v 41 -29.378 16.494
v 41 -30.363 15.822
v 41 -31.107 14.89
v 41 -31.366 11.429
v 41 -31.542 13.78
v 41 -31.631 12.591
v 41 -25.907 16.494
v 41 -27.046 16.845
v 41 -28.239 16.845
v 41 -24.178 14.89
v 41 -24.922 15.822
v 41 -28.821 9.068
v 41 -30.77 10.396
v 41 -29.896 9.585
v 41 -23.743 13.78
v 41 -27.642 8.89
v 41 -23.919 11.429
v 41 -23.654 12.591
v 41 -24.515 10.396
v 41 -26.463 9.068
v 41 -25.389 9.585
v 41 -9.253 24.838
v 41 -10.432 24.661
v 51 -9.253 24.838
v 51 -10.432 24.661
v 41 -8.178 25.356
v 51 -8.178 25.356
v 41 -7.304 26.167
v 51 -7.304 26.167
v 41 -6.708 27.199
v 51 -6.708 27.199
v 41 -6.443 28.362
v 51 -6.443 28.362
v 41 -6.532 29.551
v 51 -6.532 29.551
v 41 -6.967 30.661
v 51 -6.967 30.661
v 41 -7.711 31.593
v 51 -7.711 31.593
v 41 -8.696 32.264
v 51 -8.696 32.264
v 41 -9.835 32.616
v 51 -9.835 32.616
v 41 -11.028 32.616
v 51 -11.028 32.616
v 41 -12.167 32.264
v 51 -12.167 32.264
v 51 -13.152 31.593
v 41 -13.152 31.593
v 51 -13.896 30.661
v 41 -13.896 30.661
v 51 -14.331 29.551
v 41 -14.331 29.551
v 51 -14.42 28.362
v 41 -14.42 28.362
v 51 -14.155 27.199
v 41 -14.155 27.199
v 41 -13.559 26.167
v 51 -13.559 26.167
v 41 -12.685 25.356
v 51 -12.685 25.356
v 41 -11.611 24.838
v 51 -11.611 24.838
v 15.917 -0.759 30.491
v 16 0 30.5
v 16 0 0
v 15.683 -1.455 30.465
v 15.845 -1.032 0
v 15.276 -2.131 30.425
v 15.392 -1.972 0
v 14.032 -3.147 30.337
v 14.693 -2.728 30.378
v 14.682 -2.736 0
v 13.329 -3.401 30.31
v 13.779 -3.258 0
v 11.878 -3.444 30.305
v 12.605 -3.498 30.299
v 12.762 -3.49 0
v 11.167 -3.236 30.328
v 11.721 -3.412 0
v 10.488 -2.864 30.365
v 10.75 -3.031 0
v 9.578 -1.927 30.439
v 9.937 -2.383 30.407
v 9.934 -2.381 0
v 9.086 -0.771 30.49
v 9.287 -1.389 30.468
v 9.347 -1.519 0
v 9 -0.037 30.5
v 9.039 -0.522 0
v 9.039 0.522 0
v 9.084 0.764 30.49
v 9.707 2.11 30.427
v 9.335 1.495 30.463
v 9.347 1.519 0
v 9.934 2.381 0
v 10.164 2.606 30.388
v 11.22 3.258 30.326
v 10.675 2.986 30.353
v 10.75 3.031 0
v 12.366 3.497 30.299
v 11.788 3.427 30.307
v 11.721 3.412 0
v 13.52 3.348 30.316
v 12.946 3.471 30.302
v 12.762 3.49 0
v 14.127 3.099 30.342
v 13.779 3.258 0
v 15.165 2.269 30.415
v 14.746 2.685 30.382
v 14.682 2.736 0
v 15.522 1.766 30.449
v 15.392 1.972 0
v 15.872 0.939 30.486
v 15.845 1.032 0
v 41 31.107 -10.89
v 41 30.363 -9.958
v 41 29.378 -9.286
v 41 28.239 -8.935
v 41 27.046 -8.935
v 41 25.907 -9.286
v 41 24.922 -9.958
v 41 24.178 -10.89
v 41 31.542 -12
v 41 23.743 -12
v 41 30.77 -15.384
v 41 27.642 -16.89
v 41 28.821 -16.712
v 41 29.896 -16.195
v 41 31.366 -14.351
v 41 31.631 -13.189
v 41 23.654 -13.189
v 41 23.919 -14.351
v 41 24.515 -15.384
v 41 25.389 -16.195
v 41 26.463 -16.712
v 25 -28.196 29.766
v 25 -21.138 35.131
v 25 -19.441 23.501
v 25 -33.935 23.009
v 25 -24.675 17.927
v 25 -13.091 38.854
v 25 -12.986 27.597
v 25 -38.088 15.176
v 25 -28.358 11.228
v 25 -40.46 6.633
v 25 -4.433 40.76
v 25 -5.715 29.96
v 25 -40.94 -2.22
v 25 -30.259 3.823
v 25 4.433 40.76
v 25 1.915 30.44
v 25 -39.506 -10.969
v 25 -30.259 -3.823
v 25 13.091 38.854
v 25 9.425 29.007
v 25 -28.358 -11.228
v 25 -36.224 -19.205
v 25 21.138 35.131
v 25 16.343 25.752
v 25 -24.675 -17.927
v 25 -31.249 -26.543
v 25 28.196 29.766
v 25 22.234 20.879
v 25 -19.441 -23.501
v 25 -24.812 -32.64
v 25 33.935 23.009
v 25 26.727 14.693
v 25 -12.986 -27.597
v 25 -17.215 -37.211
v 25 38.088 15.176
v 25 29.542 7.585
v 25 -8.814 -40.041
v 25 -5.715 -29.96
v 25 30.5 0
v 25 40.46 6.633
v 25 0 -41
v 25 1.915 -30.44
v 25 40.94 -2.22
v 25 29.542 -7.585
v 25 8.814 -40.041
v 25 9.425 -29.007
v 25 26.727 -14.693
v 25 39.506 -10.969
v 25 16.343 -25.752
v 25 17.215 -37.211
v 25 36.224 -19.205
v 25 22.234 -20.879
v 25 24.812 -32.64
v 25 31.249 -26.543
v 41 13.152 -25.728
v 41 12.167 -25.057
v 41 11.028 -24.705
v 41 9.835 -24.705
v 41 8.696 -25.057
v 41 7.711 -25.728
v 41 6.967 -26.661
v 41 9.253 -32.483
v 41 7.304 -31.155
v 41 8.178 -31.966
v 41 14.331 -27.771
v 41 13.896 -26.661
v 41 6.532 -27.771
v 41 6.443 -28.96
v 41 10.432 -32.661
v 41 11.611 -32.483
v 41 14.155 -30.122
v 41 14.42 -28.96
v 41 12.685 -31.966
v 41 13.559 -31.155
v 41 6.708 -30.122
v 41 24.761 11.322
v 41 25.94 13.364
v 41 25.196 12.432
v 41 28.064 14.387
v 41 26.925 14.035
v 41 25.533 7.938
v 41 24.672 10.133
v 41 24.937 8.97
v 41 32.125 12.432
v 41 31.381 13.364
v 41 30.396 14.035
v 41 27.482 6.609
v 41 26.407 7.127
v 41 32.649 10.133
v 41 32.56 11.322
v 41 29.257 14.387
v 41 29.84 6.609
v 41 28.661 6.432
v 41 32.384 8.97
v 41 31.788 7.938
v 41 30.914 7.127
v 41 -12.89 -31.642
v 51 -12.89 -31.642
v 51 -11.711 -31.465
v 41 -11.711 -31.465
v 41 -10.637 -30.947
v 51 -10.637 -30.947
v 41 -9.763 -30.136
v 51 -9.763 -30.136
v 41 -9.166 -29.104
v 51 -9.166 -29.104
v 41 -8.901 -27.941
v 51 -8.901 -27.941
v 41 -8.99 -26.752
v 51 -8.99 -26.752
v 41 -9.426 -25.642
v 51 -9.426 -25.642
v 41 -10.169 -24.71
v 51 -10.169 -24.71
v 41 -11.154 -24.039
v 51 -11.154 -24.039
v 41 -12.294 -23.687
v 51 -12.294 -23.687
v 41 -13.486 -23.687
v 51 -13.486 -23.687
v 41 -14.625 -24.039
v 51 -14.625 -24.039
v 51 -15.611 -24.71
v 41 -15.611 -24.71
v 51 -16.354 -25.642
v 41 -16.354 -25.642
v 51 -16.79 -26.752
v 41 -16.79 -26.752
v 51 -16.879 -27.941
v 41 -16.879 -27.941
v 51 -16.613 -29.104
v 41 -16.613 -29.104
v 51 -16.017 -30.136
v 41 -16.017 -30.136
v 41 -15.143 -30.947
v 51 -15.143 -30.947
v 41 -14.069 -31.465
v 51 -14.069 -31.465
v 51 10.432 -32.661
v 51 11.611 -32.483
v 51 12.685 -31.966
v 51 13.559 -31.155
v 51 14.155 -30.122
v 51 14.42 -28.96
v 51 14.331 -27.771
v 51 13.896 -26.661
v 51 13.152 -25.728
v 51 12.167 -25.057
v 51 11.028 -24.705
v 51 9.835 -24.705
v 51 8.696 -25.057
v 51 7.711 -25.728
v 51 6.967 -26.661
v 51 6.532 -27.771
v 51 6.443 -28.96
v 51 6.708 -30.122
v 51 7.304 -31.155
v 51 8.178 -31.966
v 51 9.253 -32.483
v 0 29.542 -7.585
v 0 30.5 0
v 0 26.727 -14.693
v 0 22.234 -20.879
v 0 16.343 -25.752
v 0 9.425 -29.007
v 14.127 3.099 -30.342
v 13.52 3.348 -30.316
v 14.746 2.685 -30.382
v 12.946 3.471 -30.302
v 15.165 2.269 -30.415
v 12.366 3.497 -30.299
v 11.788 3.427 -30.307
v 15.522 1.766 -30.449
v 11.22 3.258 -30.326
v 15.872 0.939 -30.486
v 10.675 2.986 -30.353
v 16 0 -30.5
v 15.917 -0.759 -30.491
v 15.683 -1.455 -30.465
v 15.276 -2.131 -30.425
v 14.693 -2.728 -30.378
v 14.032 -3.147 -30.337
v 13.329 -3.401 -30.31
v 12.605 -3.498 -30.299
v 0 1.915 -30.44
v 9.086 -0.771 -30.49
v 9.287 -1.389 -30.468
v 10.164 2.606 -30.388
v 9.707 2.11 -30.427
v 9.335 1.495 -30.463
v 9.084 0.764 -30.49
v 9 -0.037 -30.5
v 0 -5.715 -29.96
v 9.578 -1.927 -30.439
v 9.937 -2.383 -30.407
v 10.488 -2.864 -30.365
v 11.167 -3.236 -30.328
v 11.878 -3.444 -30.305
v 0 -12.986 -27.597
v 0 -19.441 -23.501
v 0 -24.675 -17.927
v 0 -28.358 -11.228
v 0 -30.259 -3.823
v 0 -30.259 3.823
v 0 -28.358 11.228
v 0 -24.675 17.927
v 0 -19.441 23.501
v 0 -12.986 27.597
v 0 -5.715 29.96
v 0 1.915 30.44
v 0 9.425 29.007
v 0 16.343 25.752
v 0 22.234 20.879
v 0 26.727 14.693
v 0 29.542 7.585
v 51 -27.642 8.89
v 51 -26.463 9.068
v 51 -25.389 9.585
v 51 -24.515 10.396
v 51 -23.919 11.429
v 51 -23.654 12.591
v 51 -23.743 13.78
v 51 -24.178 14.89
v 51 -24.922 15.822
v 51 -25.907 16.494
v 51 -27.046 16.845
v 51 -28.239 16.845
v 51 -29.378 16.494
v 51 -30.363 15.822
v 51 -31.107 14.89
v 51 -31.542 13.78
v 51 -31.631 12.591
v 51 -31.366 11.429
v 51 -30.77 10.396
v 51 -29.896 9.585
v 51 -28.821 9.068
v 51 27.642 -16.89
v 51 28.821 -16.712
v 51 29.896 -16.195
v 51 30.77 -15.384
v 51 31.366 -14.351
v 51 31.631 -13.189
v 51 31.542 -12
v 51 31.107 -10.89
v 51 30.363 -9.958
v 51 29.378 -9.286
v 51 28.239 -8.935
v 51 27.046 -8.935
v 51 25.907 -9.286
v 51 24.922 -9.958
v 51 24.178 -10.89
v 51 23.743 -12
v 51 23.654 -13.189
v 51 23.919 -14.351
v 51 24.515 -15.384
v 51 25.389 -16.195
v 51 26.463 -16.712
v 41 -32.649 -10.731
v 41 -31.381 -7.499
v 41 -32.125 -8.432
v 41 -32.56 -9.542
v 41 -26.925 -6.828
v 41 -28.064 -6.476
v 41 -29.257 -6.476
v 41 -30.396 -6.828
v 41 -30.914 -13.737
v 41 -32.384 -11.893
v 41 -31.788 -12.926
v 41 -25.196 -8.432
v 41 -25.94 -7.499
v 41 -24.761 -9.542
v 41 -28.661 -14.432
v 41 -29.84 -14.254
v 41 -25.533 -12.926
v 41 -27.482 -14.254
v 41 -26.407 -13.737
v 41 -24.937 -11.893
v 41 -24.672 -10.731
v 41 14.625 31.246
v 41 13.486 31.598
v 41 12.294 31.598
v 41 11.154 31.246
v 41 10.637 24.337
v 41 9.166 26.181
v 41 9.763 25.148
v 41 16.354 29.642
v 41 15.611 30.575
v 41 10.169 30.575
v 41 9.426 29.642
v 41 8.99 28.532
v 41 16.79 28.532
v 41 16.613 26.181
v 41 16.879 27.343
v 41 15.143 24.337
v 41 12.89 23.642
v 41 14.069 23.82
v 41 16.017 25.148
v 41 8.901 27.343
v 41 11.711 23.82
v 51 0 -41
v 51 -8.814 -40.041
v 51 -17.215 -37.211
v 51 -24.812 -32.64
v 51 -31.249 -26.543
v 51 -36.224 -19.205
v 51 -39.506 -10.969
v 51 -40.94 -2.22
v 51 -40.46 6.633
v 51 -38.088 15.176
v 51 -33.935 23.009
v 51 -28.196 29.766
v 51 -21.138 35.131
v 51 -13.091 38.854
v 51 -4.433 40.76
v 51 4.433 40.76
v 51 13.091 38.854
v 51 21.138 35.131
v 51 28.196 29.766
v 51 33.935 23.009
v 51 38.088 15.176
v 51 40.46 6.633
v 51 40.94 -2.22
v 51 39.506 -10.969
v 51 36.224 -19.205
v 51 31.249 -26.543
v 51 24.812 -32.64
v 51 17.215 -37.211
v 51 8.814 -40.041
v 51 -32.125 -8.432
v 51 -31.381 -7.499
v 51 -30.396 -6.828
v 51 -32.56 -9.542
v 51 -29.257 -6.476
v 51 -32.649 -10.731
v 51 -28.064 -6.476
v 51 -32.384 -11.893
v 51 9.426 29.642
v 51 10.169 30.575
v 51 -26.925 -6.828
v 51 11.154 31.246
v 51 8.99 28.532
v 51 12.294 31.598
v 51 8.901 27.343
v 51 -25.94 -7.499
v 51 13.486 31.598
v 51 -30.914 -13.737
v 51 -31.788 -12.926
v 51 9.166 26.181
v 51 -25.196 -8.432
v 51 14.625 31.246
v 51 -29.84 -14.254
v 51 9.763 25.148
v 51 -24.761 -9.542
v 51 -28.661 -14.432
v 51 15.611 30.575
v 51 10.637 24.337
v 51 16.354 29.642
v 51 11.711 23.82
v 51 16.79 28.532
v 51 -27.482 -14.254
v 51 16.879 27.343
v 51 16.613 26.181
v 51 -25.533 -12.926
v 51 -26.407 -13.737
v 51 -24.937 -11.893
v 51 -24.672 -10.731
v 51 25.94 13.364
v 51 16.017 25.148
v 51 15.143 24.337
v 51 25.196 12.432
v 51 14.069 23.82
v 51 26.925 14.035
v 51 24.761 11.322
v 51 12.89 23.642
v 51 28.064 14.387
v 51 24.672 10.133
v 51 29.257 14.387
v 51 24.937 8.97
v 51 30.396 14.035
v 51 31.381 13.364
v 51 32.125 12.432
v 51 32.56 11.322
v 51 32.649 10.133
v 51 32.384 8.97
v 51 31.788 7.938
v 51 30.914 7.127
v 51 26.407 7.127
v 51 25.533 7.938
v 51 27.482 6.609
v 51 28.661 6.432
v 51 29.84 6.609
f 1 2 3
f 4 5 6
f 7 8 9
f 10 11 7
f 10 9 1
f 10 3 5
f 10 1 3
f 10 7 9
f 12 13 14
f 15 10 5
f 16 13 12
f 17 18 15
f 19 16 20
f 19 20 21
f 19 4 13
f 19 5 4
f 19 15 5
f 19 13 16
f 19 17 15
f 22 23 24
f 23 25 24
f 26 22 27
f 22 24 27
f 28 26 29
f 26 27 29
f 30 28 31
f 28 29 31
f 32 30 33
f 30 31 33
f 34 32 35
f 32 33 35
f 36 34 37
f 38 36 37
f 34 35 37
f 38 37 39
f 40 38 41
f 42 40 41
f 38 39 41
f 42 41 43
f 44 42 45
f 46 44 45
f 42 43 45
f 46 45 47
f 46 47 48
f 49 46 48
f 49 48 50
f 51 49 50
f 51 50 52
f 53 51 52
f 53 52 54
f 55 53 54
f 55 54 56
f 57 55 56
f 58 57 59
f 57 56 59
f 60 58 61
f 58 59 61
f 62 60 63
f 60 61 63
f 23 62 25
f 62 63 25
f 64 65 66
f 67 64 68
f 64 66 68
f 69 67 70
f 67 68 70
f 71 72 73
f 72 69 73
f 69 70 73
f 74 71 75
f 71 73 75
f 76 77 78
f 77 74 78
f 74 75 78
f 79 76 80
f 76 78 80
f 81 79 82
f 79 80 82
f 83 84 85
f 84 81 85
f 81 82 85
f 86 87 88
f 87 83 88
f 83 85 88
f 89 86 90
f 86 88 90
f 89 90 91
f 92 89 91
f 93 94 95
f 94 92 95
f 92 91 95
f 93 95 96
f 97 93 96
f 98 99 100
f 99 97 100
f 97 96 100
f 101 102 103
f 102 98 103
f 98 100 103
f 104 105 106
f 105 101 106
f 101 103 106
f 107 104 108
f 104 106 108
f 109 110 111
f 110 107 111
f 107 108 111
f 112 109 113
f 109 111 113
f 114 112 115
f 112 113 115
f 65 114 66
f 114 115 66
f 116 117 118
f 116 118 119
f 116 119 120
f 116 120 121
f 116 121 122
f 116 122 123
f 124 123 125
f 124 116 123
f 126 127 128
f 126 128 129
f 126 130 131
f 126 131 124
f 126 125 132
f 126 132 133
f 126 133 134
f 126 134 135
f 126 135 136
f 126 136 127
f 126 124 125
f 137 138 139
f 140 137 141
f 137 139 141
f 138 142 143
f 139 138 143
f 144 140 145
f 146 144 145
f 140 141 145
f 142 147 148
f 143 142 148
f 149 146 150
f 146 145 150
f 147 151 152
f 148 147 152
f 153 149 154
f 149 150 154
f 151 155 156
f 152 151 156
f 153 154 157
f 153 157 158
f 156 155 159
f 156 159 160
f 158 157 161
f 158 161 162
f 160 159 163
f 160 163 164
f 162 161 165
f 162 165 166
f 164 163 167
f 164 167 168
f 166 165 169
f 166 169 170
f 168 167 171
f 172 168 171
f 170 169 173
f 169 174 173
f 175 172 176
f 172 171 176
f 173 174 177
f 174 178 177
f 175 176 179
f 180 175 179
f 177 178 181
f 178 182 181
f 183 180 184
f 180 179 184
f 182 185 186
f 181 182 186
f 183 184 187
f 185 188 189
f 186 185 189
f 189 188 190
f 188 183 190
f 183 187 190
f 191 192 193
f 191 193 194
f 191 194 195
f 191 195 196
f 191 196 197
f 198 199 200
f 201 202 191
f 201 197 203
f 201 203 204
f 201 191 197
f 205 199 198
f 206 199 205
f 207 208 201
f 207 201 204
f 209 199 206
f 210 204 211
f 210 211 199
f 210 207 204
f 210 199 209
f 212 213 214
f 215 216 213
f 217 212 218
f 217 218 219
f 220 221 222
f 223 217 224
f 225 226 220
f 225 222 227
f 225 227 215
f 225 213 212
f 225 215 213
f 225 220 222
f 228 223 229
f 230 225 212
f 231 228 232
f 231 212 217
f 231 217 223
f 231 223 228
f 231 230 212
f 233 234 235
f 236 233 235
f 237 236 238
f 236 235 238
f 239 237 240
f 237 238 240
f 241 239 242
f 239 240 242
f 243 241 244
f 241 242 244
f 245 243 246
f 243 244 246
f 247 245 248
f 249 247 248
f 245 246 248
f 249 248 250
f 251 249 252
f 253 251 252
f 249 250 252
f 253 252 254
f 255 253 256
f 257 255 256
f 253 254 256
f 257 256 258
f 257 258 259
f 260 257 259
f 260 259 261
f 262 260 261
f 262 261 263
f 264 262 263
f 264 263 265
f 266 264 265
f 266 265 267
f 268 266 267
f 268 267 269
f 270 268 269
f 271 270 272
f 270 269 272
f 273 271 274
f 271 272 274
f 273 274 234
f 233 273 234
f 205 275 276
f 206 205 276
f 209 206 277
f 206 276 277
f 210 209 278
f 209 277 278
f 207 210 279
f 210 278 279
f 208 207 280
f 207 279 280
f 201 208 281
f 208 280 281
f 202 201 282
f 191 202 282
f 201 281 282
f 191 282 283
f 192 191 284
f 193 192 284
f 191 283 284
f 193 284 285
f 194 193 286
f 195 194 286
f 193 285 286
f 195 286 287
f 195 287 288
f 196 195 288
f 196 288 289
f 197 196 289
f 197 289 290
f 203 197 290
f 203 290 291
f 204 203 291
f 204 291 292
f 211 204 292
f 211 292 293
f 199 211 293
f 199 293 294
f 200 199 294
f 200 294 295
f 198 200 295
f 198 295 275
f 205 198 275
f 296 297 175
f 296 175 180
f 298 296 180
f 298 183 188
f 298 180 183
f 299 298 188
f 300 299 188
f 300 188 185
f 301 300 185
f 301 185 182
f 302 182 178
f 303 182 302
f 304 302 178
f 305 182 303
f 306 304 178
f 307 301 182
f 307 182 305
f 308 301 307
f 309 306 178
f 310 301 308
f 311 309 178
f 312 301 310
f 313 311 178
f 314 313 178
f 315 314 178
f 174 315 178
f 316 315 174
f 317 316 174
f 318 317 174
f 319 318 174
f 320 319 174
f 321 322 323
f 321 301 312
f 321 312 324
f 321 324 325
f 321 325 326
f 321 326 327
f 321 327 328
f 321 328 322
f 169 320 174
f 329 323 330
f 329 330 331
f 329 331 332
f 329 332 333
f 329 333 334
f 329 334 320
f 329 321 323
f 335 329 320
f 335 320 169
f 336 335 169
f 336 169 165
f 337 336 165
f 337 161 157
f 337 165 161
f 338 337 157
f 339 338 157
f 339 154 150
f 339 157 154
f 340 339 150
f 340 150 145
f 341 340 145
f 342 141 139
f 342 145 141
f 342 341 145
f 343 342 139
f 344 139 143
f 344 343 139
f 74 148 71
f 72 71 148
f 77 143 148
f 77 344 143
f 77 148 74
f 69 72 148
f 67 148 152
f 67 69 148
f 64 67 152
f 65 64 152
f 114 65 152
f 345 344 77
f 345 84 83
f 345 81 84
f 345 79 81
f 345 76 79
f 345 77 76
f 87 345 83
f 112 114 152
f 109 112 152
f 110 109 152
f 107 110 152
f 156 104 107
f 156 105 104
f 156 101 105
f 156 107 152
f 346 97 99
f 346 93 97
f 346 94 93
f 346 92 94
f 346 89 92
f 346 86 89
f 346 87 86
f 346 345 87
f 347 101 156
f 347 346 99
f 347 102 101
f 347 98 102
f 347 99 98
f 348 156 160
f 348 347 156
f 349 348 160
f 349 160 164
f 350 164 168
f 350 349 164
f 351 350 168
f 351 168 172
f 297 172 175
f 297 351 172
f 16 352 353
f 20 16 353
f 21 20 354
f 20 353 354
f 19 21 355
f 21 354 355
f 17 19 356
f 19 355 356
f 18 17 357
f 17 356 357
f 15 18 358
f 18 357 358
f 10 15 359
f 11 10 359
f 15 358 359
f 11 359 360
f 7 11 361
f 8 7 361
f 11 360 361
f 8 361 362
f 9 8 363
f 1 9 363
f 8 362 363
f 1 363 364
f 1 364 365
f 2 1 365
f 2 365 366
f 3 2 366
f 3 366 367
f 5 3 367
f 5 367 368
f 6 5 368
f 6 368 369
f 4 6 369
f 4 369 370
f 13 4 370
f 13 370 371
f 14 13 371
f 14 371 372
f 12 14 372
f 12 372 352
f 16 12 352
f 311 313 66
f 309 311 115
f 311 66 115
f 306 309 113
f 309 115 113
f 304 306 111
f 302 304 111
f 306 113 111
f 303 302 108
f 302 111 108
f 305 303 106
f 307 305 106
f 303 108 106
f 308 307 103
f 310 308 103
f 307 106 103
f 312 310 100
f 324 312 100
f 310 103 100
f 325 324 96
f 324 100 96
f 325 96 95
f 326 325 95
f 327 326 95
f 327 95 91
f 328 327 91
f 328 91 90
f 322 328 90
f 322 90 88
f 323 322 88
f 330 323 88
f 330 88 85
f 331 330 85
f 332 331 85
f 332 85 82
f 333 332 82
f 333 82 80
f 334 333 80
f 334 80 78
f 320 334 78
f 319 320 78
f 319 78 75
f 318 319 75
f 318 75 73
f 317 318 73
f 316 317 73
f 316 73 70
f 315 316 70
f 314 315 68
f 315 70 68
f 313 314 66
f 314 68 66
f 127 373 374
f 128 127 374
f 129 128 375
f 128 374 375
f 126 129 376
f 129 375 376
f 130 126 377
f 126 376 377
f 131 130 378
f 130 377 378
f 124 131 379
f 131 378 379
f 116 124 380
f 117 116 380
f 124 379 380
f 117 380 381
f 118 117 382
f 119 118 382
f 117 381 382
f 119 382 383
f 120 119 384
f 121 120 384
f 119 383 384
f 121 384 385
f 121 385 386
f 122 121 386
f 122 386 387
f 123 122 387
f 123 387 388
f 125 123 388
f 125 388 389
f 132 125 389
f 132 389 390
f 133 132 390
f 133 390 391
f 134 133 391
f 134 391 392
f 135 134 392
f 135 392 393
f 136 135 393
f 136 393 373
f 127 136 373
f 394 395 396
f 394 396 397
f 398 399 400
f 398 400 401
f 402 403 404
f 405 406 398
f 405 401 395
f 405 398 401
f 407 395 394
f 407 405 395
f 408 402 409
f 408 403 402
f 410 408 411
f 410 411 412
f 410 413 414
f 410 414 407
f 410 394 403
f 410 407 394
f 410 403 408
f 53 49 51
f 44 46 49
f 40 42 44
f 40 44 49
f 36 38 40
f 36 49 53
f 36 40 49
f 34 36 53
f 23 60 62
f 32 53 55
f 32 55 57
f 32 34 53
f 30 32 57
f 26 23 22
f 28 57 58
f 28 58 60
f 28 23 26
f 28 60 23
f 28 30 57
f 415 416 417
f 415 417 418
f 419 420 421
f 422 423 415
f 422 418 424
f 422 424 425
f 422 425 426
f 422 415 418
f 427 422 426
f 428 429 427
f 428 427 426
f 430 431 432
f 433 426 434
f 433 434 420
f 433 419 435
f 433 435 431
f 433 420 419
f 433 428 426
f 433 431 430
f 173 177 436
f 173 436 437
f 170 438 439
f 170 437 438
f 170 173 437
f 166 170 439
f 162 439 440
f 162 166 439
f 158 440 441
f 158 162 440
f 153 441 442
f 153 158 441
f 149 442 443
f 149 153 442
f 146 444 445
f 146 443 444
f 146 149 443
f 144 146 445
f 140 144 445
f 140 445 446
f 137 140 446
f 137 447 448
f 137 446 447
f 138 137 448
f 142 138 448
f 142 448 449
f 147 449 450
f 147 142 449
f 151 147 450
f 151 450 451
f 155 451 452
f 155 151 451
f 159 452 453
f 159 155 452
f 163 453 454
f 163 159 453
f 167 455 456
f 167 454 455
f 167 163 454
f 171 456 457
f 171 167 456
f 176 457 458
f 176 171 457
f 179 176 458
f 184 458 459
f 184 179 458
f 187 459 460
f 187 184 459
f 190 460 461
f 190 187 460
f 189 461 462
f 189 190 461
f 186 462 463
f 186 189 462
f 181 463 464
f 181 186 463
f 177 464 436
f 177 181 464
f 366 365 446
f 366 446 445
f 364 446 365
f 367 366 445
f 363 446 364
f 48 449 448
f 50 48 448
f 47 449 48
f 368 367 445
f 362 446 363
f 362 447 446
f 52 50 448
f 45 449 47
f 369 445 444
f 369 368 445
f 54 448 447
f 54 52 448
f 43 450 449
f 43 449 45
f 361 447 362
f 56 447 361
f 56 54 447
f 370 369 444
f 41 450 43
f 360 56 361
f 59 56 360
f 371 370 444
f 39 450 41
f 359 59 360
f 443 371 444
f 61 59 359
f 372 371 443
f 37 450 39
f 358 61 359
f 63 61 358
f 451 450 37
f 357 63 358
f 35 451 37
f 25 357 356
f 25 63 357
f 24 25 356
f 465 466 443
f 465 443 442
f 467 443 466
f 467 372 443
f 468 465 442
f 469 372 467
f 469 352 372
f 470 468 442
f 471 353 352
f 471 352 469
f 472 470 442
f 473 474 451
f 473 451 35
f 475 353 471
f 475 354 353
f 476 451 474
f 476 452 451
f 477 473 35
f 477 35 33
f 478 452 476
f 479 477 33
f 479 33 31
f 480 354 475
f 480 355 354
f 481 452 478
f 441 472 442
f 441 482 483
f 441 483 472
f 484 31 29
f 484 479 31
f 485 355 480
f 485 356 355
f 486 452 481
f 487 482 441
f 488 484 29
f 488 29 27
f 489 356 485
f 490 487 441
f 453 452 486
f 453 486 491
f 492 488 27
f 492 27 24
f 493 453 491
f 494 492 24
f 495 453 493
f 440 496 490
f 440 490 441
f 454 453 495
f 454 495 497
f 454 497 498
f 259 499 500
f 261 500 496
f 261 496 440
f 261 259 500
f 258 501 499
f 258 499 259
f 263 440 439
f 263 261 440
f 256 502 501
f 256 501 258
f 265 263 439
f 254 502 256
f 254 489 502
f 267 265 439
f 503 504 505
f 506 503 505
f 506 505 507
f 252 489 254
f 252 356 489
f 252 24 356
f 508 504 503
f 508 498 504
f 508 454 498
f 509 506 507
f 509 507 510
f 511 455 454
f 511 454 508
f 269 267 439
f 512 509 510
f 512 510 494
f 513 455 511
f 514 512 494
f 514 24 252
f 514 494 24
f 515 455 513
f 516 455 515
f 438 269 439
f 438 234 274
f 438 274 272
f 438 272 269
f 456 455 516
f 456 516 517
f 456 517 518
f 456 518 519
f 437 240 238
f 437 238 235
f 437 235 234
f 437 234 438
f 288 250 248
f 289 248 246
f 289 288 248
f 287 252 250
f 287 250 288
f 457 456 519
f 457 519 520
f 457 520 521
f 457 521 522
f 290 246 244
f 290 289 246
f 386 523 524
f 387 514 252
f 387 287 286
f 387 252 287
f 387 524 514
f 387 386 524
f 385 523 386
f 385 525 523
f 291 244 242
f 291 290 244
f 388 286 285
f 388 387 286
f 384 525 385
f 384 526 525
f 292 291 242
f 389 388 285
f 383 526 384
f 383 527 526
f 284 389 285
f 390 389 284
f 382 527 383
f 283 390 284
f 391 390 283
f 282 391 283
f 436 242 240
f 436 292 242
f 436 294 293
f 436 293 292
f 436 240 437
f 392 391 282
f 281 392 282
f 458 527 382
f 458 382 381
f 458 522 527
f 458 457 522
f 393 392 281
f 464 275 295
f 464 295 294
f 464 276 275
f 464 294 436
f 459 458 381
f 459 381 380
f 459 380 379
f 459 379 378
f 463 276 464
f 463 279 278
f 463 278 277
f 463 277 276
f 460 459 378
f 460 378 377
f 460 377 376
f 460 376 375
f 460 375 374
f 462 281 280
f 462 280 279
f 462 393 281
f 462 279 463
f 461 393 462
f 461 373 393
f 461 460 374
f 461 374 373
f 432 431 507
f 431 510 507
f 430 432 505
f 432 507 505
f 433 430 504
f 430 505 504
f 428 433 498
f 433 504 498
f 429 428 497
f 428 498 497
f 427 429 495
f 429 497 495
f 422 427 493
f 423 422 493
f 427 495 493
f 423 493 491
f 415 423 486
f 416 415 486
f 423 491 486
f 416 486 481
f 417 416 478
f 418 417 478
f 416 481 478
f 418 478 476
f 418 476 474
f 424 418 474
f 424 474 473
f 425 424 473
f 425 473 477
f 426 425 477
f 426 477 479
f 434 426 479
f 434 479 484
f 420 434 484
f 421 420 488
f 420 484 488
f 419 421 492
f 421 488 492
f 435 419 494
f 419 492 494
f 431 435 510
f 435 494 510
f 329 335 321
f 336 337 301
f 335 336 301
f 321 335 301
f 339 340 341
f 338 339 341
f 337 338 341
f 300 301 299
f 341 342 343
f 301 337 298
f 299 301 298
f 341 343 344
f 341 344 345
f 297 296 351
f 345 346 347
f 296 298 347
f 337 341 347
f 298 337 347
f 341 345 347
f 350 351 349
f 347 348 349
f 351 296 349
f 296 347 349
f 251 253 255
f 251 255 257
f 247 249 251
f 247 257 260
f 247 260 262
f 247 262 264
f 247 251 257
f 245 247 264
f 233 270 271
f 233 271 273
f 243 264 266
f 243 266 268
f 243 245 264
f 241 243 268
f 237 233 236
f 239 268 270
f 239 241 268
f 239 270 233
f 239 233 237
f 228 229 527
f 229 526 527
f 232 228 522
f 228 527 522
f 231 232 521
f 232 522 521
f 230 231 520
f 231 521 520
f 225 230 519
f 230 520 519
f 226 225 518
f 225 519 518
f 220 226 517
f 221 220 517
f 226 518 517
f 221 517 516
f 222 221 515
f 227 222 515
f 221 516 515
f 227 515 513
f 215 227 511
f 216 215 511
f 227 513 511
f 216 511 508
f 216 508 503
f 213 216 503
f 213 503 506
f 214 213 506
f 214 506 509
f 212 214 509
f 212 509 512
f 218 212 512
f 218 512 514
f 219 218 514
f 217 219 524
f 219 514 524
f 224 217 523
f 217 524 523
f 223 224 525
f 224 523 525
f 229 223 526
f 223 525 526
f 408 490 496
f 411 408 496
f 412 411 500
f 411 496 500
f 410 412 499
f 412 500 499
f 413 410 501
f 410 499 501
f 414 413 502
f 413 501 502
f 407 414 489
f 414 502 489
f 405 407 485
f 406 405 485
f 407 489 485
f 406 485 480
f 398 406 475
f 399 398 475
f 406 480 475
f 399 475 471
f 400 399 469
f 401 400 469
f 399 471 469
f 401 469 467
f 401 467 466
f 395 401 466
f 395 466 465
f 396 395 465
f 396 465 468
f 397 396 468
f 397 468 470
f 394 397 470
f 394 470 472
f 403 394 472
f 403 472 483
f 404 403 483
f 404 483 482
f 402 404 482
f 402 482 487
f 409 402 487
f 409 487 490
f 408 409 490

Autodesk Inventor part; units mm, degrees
ref_plane "YZ Plane" through (0, 0, 0) normal (1, 0, 0) x (0, 1, 0)
ref_plane "XZ Plane" through (0, 0, 0) normal (0, 1, 0) x (-1, 0, 0)
ref_plane "XY Plane" through (0, 0, 0) normal (0, 0, 1) x (1, 0, 0)
sketch "Эскиз1" plane through (0, 0, 0) normal (1, 0, 0) x (0, 1, 0)
  circle A0 centre (0, 0) radius 30.5
  dimension "d0" = 61
extrude "Выдавливание1" add sketch "Эскиз1" along normal blind 25
sketch "Эскиз2" plane through (25, 0, 0) normal (1, 0, 0) x (0, 0, -1)
  circle A0 centre (0, 0) radius 41
  dimension "d3" = 82
extrude "Выдавливание2" add sketch "Эскиз2" along normal blind 26
sketch "Эскиз3" plane through (0, 0, 0) normal (0, 0, 1) x (1, 0, 0)
  line L0 (0, 0) -> (25, 0)
  line L1 (25, -30.5) -> (25, 30.5) projected
  circle A0 centre (12.5, 0) radius 3.5
  dimension "d6" = 7
extrude "Выдавливание3" cut sketch "Эскиз3" along normal through all both and the other way through all
sketch "Эскиз4" plane through (51, 0, 0) normal (1, 0, 0) x (0, 0, -1)
  circle A0 centre (0, 0) radius 30.5 projected
  line L0 (0, 0) -> (-11.8974, 32.688)
  line L1 (0, 0) -> (0, 6.9467)
  circle A1 centre (-10.4316, 28.6606) radius 4
  line L2 (0, 0) -> (-31.5267, 14.7011)
  circle A2 centre (-27.6424, 12.8899) radius 4
  line L3 (0, 0) -> (-32.688, -11.8974)
  circle A3 centre (-28.6606, -10.4316) radius 4
  line L4 (0, 0) -> (-14.7011, -31.5267)
  circle A4 centre (-12.8899, -27.6424) radius 4
  line L5 (0, 0) -> (11.8974, -32.688)
  circle A5 centre (10.4316, -28.6606) radius 4
  line L6 (0, 0) -> (31.5267, -14.7011)
  circle A6 centre (27.6424, -12.8899) radius 4
  line L7 (0, 0) -> (32.688, 11.8974)
  circle A7 centre (28.6606, 10.4316) radius 4
  line L8 (0, 0) -> (14.7011, 31.5267)
  circle A8 centre (12.8899, 27.6424) radius 4
  dimension "d10" = 20
  dimension "d11" = 8
  dimension "d14" = 360
extrude "Выдавливание4" cut sketch "Эскиз4" against normal blind 10 contours A7 L7 A0 | A0 L7 A7 | A6 L6 A0 | A0 L6 A6 | L7 A7 A0 | A0 A7 L7 | L6 A6 A0 | A0 A6 L6 | A8 L8 A0 | A0 L8 A8 | A1 A0 L0 | L0 A0 A1 | A2 A0 L2 | L2 A0 A2 | A3 A0 L3 | L3 A0 A3 | A4 A0 L4 | L4 A0 A4 | A5 A0 L5 | L5 A0 A5 | A8 A0 L8 | A5 L5 A0 | A0 A8 L8 | L0 A1 A0 | A0 A1 L0 | L2 A2 A0 | A0 A2 L2 | L3 A3 A0 | A0 A3 L3 | L4 A4 A0 | A0 A4 L4 | L5 A5 A0
equation "\"Радиус_гибки\" = Толщина"
equation "\"Ширина_просечки\" = Толщина"
equation "\"Глубина_просечки\" = 0.5 * Толщина"
equation "\"Размер_просечки\" = 4 * Толщина"
equation "\"Мин_остаток\" = 2 * Толщина"
equation "\"Радиус_перехода\" = Радиус_гибки"
equation "\"Радиус_Якоби\" = Радиус_гибки"
equation "\"Размер_зазора\" = Толщина"
equation "\"Толщина\" = 0.5"
properties part number "хвостовик"
